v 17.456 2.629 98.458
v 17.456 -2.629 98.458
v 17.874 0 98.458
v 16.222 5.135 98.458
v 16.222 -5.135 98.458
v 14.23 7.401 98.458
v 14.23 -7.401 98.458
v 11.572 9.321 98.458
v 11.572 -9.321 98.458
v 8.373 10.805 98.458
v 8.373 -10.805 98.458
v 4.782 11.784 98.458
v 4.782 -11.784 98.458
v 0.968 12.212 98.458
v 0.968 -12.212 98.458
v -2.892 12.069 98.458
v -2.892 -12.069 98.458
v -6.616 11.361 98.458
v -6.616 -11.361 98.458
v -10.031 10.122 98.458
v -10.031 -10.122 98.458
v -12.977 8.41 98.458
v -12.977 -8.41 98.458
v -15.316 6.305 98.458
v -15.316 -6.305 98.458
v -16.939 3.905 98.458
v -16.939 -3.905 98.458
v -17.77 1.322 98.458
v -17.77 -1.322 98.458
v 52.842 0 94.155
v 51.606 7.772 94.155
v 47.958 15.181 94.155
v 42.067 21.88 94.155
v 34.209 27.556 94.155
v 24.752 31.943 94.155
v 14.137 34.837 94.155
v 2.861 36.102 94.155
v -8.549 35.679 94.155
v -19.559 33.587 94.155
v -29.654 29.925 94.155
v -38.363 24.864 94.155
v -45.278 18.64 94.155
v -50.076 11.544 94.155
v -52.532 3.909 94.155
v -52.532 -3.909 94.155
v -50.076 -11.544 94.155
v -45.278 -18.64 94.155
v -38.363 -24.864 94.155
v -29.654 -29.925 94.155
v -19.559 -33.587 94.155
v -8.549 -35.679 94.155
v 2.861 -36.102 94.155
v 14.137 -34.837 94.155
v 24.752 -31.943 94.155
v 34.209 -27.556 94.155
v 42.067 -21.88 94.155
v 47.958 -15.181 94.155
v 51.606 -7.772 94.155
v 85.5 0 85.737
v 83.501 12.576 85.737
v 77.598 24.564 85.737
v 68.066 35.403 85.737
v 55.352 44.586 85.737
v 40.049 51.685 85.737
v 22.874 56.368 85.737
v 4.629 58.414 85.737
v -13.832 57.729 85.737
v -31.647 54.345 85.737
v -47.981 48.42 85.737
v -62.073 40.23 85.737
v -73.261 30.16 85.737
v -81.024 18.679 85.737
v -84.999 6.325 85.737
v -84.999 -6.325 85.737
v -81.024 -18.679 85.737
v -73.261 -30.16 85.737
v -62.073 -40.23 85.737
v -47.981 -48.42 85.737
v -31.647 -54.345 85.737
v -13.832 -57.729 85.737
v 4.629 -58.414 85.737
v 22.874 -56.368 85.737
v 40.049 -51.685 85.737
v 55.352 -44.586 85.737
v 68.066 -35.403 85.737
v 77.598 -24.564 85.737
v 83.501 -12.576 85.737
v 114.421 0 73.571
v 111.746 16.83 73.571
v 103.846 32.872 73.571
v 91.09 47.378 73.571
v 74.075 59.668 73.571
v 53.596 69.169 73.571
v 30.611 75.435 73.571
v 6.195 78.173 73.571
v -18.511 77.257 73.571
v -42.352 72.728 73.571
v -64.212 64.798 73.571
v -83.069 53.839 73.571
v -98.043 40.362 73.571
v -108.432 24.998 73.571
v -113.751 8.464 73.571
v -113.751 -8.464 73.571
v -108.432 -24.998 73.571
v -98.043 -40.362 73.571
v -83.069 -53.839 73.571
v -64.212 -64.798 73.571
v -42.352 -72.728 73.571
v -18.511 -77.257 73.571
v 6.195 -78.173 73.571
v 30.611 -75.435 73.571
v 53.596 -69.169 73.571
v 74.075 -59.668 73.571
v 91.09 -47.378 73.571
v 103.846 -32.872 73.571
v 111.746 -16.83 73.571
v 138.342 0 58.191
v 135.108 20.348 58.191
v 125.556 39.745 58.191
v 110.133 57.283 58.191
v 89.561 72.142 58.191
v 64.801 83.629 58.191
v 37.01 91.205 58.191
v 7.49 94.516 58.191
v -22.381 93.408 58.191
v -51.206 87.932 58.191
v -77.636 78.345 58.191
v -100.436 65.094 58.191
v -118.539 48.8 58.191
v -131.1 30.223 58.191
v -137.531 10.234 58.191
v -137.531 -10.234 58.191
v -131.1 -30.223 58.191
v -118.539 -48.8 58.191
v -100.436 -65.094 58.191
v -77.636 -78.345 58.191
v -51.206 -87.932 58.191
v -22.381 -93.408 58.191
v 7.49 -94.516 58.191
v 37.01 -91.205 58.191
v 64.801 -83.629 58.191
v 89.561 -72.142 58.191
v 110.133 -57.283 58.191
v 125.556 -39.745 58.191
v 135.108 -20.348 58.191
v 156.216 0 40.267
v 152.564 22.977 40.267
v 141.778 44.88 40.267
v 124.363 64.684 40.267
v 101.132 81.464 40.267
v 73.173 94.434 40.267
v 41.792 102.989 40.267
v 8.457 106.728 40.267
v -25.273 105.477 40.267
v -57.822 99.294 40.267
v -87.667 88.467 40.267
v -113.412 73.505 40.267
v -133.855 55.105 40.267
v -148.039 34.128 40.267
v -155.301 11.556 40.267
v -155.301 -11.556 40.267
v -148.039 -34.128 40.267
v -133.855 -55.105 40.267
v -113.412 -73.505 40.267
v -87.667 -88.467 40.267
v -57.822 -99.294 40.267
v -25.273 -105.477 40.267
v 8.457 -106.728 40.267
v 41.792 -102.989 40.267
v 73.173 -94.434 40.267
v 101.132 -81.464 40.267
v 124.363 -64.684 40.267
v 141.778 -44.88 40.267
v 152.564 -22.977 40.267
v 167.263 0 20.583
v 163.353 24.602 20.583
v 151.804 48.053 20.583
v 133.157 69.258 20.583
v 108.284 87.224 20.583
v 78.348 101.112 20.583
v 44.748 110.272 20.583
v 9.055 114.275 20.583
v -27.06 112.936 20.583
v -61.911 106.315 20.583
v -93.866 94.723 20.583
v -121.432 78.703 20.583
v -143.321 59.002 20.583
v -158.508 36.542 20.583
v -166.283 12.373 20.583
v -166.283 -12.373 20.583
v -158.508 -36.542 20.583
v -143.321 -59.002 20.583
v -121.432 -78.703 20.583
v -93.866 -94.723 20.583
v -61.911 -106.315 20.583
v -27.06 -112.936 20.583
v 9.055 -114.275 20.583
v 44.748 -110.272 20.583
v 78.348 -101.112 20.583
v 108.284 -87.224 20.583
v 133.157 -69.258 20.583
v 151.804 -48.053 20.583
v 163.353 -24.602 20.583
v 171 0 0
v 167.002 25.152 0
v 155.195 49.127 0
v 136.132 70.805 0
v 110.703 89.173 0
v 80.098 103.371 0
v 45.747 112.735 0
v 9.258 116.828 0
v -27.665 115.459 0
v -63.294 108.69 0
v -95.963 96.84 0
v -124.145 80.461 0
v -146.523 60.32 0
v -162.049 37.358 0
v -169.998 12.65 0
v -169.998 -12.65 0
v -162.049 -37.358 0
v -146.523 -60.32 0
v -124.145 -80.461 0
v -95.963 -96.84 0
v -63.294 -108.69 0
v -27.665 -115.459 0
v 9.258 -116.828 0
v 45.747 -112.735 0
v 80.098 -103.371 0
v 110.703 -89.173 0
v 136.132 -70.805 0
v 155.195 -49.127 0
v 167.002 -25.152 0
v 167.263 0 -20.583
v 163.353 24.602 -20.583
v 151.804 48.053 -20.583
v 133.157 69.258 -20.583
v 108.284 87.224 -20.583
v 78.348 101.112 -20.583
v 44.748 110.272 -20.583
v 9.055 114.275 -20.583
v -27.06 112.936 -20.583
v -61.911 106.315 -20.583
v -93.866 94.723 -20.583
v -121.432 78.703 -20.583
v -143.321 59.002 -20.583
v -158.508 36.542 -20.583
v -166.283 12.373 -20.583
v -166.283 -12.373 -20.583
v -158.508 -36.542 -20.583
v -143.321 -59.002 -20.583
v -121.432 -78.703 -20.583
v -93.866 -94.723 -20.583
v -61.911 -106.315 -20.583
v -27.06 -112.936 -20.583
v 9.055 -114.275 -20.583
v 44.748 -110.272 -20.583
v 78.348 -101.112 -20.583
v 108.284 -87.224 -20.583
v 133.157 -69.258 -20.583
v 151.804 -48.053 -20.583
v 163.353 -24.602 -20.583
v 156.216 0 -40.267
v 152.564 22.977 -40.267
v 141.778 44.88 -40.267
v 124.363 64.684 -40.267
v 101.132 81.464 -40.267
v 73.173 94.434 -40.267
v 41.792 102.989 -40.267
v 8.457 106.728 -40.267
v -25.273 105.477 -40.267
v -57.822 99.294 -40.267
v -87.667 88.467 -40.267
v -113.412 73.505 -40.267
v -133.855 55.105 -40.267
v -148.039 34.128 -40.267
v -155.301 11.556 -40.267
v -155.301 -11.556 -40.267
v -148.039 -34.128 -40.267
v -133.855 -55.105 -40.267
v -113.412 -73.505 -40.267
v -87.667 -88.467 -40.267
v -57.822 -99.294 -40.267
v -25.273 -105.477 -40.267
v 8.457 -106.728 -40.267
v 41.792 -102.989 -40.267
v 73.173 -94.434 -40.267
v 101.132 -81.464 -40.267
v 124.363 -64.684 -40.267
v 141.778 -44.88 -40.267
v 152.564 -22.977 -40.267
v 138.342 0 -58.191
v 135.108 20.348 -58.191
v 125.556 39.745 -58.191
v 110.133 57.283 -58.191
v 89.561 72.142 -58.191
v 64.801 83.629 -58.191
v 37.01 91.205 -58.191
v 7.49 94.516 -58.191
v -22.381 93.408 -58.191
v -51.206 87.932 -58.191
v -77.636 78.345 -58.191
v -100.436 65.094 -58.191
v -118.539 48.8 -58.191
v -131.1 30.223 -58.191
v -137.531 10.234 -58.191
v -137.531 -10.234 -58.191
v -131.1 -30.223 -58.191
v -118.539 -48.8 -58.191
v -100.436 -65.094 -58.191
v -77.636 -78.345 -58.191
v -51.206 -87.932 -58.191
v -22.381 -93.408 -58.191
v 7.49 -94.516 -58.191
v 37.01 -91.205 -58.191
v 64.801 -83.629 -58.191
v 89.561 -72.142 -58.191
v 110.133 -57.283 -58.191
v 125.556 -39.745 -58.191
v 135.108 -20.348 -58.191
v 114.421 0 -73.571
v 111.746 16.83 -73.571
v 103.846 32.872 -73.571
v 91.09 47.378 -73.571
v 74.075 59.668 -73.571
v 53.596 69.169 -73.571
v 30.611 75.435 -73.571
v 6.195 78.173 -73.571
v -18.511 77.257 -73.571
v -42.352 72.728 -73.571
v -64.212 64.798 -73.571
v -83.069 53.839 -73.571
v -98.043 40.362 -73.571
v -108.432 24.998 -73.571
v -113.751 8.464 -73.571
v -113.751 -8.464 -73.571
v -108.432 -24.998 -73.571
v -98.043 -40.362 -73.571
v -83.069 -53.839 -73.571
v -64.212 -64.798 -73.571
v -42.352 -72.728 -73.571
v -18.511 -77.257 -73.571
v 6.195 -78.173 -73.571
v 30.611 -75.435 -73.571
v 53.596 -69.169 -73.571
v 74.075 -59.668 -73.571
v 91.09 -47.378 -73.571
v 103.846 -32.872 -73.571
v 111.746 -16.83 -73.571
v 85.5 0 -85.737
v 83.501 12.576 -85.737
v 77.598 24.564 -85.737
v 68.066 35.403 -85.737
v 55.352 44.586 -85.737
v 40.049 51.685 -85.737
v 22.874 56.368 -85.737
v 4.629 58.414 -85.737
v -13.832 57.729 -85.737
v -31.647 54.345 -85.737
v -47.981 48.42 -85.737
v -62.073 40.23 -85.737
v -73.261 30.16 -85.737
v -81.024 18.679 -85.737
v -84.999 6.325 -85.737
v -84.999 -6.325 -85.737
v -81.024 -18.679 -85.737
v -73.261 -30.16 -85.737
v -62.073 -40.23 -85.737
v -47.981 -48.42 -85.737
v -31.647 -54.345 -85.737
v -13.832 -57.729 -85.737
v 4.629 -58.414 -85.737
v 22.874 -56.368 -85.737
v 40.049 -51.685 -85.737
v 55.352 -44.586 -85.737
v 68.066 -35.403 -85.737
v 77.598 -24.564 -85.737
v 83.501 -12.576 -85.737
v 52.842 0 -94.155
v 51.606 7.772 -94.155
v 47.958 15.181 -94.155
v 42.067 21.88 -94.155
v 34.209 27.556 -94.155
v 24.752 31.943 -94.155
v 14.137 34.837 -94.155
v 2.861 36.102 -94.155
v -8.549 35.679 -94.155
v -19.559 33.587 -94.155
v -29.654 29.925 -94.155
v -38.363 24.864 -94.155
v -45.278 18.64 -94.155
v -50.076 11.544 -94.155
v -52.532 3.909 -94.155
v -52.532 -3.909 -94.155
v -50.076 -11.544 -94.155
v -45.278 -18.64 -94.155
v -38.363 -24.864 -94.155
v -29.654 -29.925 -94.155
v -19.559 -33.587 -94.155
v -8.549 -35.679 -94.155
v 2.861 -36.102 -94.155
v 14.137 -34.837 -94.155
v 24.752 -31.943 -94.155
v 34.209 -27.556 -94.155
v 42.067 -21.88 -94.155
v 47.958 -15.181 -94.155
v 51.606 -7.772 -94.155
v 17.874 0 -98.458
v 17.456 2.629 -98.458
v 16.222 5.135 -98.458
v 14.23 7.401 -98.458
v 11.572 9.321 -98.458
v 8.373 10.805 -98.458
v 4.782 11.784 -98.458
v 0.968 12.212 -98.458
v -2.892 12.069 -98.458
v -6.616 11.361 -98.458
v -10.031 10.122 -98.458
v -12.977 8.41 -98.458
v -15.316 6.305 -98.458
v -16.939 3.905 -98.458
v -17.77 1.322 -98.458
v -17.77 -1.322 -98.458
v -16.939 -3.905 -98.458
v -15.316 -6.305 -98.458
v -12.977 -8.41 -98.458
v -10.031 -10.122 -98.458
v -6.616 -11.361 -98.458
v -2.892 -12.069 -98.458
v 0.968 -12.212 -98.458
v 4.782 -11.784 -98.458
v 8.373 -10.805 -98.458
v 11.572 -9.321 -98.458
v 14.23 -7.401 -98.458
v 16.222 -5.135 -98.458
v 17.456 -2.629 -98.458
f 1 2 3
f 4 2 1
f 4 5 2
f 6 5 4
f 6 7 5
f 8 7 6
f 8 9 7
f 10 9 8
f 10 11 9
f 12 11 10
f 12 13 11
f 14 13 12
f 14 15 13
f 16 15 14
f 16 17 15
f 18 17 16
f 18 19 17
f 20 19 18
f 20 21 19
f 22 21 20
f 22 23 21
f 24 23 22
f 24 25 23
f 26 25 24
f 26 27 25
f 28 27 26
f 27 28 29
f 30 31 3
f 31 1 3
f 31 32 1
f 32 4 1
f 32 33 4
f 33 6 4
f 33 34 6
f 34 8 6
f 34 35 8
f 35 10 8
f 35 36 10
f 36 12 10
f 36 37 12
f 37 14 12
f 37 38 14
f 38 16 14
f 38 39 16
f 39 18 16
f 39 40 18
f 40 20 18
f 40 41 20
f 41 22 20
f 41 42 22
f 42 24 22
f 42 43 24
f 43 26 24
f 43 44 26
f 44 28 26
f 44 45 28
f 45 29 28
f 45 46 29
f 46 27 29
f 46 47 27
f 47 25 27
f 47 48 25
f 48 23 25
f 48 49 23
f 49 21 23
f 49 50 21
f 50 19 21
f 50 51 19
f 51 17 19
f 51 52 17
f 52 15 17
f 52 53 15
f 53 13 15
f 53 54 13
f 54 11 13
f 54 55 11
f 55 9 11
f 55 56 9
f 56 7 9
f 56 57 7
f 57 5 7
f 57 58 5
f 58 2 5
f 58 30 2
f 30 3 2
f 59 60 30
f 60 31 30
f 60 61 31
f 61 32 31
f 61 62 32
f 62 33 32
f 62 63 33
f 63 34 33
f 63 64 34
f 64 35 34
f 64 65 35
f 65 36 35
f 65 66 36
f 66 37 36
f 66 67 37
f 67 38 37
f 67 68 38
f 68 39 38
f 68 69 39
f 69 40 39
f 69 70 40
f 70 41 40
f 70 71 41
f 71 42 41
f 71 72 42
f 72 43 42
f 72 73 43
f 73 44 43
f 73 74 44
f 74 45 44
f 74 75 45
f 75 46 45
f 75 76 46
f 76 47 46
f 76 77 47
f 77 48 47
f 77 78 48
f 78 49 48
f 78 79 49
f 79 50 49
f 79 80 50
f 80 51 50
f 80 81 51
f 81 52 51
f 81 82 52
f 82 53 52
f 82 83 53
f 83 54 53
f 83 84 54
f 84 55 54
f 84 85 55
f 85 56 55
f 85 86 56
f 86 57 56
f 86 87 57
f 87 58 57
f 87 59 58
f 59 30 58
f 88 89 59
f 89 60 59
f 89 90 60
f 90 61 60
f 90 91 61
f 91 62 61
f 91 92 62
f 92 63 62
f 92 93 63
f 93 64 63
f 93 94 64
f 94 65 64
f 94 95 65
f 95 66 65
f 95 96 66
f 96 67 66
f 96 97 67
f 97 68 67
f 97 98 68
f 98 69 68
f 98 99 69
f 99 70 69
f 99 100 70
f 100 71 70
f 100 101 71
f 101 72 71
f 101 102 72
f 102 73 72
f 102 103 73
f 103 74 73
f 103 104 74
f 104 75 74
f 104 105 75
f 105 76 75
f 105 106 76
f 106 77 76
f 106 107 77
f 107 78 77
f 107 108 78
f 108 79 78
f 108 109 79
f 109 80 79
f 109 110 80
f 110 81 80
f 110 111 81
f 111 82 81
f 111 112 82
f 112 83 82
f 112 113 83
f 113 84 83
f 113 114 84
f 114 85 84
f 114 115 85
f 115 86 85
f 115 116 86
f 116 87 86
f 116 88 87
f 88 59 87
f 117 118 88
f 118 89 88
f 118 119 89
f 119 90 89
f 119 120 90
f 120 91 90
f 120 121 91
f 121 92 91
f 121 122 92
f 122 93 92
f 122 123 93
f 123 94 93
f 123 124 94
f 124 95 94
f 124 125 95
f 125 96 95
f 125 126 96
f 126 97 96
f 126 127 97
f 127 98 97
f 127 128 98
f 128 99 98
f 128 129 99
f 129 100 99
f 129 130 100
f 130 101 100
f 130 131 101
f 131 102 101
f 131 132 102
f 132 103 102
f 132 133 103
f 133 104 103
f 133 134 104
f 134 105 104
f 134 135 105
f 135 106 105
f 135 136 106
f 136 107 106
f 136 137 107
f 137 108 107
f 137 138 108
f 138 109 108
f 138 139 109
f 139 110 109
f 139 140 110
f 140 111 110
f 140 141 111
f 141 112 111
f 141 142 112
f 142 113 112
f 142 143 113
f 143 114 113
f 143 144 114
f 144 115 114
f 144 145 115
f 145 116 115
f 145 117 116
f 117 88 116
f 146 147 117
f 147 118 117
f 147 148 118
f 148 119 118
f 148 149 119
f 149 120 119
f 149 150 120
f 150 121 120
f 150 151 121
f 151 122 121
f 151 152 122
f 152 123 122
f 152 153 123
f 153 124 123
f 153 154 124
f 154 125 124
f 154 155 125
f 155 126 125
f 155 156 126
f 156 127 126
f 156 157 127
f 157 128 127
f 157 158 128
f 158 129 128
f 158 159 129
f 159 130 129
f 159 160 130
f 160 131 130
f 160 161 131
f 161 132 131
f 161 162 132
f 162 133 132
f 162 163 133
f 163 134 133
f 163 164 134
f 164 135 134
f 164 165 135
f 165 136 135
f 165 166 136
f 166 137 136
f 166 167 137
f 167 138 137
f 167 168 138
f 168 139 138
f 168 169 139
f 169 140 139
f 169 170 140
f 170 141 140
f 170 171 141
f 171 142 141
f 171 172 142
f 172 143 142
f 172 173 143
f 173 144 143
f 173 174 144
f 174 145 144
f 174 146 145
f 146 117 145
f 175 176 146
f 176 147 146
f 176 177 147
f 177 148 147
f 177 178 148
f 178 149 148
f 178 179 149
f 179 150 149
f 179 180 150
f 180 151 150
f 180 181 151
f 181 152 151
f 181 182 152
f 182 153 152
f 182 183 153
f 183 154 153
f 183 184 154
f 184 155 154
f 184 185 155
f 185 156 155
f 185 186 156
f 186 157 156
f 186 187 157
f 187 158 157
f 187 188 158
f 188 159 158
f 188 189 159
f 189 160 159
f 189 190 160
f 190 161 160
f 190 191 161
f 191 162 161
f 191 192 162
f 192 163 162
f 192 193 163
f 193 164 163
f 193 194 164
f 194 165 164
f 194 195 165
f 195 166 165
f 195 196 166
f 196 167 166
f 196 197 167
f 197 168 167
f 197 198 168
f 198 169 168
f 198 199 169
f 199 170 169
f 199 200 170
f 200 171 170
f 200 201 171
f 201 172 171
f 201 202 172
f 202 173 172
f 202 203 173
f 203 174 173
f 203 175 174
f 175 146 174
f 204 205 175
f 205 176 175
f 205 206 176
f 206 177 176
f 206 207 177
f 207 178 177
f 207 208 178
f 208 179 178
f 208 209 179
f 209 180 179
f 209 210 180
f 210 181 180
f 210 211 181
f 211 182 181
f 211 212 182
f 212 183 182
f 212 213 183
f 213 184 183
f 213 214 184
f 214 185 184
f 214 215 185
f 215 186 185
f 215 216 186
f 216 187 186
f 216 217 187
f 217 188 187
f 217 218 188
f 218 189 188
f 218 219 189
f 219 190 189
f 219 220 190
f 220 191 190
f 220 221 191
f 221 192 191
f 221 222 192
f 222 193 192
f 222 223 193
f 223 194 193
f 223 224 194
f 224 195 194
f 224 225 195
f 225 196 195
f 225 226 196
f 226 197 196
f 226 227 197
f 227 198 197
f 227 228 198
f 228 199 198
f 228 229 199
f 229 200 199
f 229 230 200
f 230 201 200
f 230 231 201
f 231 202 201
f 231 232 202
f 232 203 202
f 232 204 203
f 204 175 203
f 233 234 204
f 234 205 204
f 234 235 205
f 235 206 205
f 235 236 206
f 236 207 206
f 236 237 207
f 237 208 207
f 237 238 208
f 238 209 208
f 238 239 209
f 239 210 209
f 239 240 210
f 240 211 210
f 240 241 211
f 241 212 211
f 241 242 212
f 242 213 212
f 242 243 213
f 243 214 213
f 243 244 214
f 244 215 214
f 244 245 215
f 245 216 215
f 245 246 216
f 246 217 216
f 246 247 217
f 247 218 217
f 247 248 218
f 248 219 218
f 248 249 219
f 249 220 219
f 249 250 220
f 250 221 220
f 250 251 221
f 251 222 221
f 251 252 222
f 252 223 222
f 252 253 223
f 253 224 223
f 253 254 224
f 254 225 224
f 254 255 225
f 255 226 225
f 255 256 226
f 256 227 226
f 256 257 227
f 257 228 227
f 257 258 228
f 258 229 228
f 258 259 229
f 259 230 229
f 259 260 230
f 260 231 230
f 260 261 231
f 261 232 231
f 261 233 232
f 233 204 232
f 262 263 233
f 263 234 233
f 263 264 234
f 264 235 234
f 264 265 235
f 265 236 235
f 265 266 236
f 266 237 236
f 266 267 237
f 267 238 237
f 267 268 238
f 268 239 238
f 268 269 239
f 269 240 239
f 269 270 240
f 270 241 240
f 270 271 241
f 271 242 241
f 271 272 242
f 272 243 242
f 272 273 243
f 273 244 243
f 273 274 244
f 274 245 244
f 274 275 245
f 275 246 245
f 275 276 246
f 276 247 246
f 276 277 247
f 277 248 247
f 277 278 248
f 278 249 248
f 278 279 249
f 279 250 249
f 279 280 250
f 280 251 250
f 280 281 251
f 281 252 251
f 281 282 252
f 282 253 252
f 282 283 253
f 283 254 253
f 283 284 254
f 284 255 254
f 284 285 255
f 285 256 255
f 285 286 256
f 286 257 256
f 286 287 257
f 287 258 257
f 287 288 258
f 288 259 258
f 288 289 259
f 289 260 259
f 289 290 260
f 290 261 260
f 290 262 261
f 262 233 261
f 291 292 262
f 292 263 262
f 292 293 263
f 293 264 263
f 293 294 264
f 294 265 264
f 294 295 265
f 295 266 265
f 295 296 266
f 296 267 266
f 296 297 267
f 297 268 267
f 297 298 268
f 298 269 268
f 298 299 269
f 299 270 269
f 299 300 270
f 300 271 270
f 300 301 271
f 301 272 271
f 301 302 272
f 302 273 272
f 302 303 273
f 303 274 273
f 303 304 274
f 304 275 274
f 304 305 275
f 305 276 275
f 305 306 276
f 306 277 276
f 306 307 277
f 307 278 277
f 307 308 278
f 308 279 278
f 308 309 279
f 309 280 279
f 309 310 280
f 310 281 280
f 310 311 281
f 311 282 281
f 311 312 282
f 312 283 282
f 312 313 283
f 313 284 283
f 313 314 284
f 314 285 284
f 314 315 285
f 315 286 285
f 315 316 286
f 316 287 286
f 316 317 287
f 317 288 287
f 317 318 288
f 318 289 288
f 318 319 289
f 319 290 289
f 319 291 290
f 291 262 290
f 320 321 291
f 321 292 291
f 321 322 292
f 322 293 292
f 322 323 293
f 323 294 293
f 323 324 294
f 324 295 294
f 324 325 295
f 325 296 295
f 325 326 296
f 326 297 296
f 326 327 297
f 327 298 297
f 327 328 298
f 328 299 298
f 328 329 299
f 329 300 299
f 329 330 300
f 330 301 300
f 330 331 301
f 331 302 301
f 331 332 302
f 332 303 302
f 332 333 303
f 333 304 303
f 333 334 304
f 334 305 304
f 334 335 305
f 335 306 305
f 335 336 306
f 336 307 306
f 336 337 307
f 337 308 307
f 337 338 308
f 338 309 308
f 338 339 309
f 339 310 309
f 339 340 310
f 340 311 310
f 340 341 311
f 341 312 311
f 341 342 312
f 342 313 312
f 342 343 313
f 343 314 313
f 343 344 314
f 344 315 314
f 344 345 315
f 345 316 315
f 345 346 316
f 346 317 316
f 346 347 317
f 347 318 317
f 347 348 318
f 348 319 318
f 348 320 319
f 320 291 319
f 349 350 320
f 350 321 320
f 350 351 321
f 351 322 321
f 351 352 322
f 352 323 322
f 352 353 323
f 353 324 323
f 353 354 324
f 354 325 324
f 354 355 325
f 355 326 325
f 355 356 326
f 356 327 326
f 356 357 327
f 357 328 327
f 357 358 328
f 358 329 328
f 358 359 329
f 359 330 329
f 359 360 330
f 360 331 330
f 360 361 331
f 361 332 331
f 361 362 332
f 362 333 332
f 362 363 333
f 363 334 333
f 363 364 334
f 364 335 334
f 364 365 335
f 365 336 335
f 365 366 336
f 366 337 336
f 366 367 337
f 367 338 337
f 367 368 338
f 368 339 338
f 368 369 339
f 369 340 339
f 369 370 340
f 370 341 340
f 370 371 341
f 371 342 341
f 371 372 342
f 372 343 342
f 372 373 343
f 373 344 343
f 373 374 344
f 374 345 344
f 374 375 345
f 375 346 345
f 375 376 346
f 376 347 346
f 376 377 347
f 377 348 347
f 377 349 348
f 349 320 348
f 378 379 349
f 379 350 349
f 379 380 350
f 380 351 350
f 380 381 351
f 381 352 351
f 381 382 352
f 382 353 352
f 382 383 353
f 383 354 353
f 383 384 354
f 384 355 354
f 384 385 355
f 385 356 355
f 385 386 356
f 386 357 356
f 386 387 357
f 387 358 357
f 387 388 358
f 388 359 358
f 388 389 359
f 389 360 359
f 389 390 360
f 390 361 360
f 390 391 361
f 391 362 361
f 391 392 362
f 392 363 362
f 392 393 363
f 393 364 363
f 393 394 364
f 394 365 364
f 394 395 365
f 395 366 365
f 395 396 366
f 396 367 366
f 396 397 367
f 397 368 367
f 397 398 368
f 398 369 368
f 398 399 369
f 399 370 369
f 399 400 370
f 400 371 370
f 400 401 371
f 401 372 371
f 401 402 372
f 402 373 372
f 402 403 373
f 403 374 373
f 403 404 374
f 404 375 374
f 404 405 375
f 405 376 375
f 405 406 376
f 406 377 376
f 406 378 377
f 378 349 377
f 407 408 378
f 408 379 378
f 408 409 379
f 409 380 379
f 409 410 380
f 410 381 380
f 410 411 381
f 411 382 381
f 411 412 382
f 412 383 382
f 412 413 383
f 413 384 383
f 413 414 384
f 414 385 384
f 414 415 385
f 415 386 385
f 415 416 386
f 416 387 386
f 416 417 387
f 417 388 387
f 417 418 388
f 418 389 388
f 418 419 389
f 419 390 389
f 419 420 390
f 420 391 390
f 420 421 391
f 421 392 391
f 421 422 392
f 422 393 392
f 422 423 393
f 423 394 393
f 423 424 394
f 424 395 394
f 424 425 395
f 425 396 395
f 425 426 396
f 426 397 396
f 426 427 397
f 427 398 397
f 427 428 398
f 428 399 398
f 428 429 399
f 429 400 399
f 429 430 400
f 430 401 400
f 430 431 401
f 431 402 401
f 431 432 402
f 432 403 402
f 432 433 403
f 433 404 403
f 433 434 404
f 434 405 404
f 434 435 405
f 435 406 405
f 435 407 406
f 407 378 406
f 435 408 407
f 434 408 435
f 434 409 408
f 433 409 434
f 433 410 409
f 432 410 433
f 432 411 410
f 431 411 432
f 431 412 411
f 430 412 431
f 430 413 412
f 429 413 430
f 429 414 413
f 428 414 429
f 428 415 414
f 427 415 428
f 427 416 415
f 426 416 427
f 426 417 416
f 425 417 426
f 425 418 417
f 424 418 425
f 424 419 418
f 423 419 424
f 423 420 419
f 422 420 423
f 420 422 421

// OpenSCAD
// Generated by SolidPython 1.0.1 on 2020-07-29 00:46:54


scale(v = [19, 13, 11]) {
	sphere(r = 9);
}
/***********************************************
*********      SolidPython code:      **********
************************************************
 
# import packages: SolidPython
from solid import *
from solid.utils import *
from itertools import chain, combinations, permutations


class Resize:

    def __init__(self, scad_file):
        self.scad_file = scad_file
        #self.scad_file = import_scad(scad_file)
        # cone/cylinder param:
        self.r1 = 0
        self.r2 = 0
        self.h = 0
        # rectangular prism param:
        self.w = 0
        self.l = 0
        # ellipse param:
        self.r = 0

    # import OpenScad code (file name corresponds to shape)


    # classify shape + parameters
    def assign(self, param1, param2, param3):
        if self.scad_file == 'cone.scad':
            self.r1 = param1
            self.r2 = param2
            self.h = param3
        elif self.scad_file == 'cylinder.scad':
            self.r1 = param1
            self.r2 = param2
            self.h = param3
        elif self.scad_file == 'rectangularPrism.scad':
            self.h = param1
            self.l = param2
            self.w = param3
        else:
            self.r = param1
            self.h = param2

    # resize parameters
    def iterate(self):
        x = range(3, 20, 2)
        i = 1
        if self.scad_file == 'cone.scad':
            tempList = list(permutations(x, 2))
            for temp in tempList:
                param1 = temp[0]
                param2 = temp[1]
                filepath = 'produced_scad_files/' + 'cone' + str(param1) + '_' + str(param2) + '_' + '.scad'
                scad_render_to_file(cylinder(h=param1, r1=param2, r2=0), filepath)

        elif self.scad_file == 'cylinder.scad':
            tempList = list(permutations(x, 3))
            for temp in tempList:
                param1 = temp[0]
                param2 = temp[1]
                filepath = 'produced_scad_files/' + 'cylinder' + str(param1) + '_' + str(param2) + '_' + '.scad'
                scad_render_to_file(cylinder(h=param1, r1=param2, r2=param2), filepath)

        elif self.scad_file == 'rectangularPrism.scad':
            tempList = list(permutations(x, 3))
            for temp in tempList:
                param1 = temp[0]
                param2 = temp[1]
                param3 = temp[2]
                filepath = 'produced_scad_files/' + 'rectangularPrism' + str(param1) + '_' + str(param2) + '_' + str(
                    param3) + '.scad'
                scad_render_to_file(cube(size=(param1, param2, param3)), filepath)

        elif self.scad_file == 'ellipse.scad':
            tempList = list(permutations(x, 4))
            for temp in tempList:
                param1 = temp[0]
                param2 = temp[1]
                param3 = temp[2]
                param4 = temp[3]
                filepath = 'produced_scad_files/' + 'ellipse' + str(param1) + '_' + str(param2) + '_' + str(param3) + '_' + str(param4) + '.scad'
                scad_render_to_file(scale([param1, param2, param3])(sphere(r=param4)), filepath)

    def render_to_scadfile(self):
        scad_render_to_file(scad, 'example.scad') 
 
************************************************/
